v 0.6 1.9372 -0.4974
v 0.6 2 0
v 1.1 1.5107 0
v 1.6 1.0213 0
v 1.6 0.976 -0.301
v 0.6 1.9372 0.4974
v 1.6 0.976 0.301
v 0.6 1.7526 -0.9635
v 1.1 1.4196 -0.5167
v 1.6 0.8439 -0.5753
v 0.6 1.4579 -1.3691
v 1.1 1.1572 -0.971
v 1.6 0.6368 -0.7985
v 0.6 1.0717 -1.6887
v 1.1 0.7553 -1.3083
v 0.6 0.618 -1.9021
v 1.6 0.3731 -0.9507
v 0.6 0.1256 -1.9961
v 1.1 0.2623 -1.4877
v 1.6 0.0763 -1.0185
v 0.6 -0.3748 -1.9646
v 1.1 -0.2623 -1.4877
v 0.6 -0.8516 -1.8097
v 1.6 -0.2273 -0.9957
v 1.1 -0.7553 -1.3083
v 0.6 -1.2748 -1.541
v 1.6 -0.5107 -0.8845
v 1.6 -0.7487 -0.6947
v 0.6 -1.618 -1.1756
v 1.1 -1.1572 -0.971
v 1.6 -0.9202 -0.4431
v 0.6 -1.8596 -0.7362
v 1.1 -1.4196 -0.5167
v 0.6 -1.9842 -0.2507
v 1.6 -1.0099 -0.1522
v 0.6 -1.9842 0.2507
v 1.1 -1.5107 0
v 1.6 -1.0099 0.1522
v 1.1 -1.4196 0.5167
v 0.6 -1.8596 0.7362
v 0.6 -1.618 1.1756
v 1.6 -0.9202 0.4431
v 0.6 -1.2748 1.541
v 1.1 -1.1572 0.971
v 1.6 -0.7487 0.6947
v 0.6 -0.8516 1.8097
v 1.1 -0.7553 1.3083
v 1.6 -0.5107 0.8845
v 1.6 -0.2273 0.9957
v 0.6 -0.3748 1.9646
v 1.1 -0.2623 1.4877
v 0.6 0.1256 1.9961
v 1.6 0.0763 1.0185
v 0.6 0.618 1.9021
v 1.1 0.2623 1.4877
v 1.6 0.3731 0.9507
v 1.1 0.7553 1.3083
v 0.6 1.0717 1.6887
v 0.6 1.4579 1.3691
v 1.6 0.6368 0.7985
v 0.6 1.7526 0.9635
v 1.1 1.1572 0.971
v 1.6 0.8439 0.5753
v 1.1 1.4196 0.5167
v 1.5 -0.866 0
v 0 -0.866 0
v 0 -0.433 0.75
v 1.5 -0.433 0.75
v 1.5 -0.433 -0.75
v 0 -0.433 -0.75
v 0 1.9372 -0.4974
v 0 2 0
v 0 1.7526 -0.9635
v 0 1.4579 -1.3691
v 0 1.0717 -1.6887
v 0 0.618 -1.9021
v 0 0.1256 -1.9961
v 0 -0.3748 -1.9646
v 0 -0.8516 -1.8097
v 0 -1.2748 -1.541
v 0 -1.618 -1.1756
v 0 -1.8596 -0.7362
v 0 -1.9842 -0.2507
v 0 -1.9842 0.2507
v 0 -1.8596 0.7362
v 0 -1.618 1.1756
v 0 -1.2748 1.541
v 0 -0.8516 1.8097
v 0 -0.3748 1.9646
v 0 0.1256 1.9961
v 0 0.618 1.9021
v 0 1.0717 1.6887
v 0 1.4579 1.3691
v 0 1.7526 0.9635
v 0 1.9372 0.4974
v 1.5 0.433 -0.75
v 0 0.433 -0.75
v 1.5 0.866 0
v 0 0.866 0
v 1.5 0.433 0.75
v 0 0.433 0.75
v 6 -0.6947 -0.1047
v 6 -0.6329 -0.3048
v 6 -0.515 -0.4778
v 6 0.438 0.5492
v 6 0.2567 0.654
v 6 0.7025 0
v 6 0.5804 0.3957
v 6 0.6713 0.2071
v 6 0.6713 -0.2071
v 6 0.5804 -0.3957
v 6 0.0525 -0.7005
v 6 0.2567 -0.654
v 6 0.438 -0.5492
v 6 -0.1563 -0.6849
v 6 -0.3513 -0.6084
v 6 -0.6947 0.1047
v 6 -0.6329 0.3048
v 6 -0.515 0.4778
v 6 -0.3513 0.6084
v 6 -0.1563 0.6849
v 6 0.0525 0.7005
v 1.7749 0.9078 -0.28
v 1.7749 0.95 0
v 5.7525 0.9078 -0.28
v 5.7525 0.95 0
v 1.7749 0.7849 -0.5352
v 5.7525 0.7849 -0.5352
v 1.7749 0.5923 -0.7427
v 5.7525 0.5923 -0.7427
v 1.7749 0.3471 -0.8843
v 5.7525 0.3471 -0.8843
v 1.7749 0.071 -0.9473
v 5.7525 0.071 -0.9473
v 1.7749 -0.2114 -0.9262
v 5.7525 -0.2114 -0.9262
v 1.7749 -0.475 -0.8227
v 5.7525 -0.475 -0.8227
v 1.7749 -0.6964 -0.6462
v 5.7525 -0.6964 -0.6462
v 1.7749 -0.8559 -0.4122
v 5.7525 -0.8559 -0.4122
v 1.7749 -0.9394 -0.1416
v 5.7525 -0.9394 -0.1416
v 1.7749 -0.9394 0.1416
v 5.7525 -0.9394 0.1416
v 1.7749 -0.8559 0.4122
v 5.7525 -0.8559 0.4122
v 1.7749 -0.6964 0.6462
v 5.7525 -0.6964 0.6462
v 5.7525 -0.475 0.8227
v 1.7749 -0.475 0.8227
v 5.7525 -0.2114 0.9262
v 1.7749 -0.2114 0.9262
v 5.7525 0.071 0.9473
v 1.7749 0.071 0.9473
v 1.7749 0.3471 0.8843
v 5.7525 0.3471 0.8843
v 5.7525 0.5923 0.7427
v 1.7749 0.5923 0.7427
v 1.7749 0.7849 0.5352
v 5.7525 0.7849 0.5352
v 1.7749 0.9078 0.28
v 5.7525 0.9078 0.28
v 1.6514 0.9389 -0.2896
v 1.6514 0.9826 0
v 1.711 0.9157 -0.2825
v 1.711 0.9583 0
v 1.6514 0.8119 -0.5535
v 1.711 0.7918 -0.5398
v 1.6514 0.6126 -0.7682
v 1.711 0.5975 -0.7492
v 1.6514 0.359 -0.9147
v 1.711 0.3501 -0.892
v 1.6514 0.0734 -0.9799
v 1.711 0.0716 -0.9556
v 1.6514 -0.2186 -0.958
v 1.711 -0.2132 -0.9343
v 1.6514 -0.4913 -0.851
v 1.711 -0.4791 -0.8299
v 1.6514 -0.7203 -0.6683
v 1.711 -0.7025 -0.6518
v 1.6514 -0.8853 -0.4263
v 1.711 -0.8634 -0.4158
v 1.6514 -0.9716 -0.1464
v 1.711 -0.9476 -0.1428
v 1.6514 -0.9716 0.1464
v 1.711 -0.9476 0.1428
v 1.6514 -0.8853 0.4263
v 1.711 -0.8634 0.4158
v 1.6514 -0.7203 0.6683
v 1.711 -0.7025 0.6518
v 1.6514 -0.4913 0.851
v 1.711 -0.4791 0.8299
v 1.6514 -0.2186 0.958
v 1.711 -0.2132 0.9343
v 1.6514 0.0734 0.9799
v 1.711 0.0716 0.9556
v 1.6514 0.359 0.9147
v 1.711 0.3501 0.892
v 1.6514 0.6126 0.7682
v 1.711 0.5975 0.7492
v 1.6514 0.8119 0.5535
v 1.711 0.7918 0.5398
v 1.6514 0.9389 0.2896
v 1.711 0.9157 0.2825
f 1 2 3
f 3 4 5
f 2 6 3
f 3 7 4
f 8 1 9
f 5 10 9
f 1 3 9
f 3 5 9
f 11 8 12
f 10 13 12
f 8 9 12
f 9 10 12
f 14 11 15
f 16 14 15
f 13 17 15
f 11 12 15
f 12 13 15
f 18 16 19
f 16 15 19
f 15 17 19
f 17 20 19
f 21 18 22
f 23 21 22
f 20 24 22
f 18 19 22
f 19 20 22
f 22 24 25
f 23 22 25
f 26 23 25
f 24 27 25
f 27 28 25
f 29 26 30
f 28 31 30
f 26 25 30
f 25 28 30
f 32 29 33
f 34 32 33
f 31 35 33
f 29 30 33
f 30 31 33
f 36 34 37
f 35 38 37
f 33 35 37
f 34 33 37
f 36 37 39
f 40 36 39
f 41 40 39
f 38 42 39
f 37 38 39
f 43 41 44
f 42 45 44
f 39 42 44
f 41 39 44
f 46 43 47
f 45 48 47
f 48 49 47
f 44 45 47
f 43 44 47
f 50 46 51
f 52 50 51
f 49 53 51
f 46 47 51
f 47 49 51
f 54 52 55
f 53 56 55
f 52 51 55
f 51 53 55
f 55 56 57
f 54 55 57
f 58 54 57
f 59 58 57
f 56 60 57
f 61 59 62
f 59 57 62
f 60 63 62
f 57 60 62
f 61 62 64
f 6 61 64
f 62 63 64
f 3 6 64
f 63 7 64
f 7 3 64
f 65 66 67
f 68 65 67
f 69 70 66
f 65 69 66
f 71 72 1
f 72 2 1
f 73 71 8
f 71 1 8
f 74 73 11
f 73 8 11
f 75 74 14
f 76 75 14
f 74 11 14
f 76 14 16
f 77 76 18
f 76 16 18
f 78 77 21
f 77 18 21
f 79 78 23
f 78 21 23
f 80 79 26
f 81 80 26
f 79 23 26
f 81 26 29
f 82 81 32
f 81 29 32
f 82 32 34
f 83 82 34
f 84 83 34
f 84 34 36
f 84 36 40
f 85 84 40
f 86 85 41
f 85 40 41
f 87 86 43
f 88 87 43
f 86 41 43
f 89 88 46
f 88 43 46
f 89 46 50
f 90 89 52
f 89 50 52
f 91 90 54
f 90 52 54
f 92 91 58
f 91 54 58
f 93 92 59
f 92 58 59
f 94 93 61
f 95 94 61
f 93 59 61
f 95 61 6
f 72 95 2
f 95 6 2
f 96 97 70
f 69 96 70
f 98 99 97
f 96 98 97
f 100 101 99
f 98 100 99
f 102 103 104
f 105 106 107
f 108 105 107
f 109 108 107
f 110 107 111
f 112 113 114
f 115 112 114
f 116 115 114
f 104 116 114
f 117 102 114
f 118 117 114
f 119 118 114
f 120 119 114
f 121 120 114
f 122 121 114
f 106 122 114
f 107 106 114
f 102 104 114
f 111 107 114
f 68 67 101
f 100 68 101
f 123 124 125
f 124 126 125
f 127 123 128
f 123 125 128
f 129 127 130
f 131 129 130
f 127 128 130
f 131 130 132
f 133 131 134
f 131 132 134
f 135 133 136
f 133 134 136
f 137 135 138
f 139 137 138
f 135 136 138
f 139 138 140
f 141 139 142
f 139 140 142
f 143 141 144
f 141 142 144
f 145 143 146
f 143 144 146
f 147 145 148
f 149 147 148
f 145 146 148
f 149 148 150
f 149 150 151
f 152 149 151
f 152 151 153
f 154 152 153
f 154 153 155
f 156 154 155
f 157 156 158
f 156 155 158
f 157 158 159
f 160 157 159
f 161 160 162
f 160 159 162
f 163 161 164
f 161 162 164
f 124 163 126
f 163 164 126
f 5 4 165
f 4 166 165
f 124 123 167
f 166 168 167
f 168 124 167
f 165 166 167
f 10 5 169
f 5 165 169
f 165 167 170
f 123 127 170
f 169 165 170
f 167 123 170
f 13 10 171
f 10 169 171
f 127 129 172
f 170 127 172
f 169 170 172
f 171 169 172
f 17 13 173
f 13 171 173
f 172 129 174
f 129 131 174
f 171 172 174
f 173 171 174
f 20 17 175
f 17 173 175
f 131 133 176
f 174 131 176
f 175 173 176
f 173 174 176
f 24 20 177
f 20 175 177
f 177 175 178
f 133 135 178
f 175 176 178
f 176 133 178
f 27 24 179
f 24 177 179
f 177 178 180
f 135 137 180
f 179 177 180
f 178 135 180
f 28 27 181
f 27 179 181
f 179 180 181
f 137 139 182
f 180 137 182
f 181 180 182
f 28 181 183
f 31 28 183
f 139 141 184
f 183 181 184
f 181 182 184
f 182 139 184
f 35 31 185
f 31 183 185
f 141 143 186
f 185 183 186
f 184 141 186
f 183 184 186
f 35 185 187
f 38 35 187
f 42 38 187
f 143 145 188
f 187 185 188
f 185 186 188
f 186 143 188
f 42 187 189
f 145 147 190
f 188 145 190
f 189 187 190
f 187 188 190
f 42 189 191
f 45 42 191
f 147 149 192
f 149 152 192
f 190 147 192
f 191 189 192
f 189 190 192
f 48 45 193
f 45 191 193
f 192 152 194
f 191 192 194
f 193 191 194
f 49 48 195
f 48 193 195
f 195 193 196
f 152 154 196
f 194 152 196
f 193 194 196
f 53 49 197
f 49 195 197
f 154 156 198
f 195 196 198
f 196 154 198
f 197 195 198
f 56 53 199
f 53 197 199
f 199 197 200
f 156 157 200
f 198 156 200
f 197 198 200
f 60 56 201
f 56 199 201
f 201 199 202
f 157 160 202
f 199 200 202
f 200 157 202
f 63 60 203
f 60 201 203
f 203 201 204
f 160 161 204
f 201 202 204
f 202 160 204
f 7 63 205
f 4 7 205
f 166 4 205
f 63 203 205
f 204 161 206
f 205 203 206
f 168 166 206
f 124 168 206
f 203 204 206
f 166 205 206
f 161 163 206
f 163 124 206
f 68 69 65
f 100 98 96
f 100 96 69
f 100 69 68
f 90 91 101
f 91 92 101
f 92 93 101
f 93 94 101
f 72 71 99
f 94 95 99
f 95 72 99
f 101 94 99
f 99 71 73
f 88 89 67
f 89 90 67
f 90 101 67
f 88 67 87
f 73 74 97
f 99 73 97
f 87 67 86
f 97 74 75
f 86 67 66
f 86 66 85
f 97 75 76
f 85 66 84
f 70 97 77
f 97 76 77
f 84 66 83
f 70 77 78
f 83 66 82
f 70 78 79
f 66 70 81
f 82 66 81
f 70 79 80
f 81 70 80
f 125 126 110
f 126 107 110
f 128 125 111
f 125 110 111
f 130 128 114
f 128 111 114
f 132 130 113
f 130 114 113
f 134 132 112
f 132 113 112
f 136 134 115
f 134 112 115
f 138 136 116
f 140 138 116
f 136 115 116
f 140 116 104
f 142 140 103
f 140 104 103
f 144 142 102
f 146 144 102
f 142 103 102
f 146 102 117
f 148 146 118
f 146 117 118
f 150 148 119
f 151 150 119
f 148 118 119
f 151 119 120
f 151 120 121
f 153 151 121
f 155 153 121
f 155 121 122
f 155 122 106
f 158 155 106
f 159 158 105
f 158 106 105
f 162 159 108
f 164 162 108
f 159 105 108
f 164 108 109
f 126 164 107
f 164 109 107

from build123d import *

# Parameters (mm, degrees)
CUT_EXTRUDE1_DEPTH = 1.5


with BuildPart() as part:
    # Sketch1 → Revolve1 (revolve)
    with BuildSketch(Plane.XY):
        with BuildLine():
            Line((1.774861053, 0.95), (5.752512627, 0.95))
            Line((5.752512627, 0.95), (6, 0.702512627))
            Line((6, 0.702512627), (6, 0))
            Line((6, 0), (0, 0))
            Line((0, 0), (0, 2))
            Line((0, 2), (0.6, 2))
            Line((0.6, 2), (1.6, 1.0213282))
            ThreePointArc((1.6, 1.0213282), (1.680436347, 0.968517873), (1.774861053, 0.95))
        make_face()
    revolve(axis=Axis((0, 0, 0), (-1, 0, 0)))

    # Sketch2 → Cut-Extrude1 (cut)
    with BuildSketch(Plane.ZY):
        Polygon((0.75, 0.433012702), (0, 0.866025404), (-0.75, 0.433012702), (-0.75, -0.433012702), (0, -0.866025404), (0.75, -0.433012702), align=None)
    extrude(amount=-CUT_EXTRUDE1_DEPTH, mode=Mode.SUBTRACT)


solid = part.part
